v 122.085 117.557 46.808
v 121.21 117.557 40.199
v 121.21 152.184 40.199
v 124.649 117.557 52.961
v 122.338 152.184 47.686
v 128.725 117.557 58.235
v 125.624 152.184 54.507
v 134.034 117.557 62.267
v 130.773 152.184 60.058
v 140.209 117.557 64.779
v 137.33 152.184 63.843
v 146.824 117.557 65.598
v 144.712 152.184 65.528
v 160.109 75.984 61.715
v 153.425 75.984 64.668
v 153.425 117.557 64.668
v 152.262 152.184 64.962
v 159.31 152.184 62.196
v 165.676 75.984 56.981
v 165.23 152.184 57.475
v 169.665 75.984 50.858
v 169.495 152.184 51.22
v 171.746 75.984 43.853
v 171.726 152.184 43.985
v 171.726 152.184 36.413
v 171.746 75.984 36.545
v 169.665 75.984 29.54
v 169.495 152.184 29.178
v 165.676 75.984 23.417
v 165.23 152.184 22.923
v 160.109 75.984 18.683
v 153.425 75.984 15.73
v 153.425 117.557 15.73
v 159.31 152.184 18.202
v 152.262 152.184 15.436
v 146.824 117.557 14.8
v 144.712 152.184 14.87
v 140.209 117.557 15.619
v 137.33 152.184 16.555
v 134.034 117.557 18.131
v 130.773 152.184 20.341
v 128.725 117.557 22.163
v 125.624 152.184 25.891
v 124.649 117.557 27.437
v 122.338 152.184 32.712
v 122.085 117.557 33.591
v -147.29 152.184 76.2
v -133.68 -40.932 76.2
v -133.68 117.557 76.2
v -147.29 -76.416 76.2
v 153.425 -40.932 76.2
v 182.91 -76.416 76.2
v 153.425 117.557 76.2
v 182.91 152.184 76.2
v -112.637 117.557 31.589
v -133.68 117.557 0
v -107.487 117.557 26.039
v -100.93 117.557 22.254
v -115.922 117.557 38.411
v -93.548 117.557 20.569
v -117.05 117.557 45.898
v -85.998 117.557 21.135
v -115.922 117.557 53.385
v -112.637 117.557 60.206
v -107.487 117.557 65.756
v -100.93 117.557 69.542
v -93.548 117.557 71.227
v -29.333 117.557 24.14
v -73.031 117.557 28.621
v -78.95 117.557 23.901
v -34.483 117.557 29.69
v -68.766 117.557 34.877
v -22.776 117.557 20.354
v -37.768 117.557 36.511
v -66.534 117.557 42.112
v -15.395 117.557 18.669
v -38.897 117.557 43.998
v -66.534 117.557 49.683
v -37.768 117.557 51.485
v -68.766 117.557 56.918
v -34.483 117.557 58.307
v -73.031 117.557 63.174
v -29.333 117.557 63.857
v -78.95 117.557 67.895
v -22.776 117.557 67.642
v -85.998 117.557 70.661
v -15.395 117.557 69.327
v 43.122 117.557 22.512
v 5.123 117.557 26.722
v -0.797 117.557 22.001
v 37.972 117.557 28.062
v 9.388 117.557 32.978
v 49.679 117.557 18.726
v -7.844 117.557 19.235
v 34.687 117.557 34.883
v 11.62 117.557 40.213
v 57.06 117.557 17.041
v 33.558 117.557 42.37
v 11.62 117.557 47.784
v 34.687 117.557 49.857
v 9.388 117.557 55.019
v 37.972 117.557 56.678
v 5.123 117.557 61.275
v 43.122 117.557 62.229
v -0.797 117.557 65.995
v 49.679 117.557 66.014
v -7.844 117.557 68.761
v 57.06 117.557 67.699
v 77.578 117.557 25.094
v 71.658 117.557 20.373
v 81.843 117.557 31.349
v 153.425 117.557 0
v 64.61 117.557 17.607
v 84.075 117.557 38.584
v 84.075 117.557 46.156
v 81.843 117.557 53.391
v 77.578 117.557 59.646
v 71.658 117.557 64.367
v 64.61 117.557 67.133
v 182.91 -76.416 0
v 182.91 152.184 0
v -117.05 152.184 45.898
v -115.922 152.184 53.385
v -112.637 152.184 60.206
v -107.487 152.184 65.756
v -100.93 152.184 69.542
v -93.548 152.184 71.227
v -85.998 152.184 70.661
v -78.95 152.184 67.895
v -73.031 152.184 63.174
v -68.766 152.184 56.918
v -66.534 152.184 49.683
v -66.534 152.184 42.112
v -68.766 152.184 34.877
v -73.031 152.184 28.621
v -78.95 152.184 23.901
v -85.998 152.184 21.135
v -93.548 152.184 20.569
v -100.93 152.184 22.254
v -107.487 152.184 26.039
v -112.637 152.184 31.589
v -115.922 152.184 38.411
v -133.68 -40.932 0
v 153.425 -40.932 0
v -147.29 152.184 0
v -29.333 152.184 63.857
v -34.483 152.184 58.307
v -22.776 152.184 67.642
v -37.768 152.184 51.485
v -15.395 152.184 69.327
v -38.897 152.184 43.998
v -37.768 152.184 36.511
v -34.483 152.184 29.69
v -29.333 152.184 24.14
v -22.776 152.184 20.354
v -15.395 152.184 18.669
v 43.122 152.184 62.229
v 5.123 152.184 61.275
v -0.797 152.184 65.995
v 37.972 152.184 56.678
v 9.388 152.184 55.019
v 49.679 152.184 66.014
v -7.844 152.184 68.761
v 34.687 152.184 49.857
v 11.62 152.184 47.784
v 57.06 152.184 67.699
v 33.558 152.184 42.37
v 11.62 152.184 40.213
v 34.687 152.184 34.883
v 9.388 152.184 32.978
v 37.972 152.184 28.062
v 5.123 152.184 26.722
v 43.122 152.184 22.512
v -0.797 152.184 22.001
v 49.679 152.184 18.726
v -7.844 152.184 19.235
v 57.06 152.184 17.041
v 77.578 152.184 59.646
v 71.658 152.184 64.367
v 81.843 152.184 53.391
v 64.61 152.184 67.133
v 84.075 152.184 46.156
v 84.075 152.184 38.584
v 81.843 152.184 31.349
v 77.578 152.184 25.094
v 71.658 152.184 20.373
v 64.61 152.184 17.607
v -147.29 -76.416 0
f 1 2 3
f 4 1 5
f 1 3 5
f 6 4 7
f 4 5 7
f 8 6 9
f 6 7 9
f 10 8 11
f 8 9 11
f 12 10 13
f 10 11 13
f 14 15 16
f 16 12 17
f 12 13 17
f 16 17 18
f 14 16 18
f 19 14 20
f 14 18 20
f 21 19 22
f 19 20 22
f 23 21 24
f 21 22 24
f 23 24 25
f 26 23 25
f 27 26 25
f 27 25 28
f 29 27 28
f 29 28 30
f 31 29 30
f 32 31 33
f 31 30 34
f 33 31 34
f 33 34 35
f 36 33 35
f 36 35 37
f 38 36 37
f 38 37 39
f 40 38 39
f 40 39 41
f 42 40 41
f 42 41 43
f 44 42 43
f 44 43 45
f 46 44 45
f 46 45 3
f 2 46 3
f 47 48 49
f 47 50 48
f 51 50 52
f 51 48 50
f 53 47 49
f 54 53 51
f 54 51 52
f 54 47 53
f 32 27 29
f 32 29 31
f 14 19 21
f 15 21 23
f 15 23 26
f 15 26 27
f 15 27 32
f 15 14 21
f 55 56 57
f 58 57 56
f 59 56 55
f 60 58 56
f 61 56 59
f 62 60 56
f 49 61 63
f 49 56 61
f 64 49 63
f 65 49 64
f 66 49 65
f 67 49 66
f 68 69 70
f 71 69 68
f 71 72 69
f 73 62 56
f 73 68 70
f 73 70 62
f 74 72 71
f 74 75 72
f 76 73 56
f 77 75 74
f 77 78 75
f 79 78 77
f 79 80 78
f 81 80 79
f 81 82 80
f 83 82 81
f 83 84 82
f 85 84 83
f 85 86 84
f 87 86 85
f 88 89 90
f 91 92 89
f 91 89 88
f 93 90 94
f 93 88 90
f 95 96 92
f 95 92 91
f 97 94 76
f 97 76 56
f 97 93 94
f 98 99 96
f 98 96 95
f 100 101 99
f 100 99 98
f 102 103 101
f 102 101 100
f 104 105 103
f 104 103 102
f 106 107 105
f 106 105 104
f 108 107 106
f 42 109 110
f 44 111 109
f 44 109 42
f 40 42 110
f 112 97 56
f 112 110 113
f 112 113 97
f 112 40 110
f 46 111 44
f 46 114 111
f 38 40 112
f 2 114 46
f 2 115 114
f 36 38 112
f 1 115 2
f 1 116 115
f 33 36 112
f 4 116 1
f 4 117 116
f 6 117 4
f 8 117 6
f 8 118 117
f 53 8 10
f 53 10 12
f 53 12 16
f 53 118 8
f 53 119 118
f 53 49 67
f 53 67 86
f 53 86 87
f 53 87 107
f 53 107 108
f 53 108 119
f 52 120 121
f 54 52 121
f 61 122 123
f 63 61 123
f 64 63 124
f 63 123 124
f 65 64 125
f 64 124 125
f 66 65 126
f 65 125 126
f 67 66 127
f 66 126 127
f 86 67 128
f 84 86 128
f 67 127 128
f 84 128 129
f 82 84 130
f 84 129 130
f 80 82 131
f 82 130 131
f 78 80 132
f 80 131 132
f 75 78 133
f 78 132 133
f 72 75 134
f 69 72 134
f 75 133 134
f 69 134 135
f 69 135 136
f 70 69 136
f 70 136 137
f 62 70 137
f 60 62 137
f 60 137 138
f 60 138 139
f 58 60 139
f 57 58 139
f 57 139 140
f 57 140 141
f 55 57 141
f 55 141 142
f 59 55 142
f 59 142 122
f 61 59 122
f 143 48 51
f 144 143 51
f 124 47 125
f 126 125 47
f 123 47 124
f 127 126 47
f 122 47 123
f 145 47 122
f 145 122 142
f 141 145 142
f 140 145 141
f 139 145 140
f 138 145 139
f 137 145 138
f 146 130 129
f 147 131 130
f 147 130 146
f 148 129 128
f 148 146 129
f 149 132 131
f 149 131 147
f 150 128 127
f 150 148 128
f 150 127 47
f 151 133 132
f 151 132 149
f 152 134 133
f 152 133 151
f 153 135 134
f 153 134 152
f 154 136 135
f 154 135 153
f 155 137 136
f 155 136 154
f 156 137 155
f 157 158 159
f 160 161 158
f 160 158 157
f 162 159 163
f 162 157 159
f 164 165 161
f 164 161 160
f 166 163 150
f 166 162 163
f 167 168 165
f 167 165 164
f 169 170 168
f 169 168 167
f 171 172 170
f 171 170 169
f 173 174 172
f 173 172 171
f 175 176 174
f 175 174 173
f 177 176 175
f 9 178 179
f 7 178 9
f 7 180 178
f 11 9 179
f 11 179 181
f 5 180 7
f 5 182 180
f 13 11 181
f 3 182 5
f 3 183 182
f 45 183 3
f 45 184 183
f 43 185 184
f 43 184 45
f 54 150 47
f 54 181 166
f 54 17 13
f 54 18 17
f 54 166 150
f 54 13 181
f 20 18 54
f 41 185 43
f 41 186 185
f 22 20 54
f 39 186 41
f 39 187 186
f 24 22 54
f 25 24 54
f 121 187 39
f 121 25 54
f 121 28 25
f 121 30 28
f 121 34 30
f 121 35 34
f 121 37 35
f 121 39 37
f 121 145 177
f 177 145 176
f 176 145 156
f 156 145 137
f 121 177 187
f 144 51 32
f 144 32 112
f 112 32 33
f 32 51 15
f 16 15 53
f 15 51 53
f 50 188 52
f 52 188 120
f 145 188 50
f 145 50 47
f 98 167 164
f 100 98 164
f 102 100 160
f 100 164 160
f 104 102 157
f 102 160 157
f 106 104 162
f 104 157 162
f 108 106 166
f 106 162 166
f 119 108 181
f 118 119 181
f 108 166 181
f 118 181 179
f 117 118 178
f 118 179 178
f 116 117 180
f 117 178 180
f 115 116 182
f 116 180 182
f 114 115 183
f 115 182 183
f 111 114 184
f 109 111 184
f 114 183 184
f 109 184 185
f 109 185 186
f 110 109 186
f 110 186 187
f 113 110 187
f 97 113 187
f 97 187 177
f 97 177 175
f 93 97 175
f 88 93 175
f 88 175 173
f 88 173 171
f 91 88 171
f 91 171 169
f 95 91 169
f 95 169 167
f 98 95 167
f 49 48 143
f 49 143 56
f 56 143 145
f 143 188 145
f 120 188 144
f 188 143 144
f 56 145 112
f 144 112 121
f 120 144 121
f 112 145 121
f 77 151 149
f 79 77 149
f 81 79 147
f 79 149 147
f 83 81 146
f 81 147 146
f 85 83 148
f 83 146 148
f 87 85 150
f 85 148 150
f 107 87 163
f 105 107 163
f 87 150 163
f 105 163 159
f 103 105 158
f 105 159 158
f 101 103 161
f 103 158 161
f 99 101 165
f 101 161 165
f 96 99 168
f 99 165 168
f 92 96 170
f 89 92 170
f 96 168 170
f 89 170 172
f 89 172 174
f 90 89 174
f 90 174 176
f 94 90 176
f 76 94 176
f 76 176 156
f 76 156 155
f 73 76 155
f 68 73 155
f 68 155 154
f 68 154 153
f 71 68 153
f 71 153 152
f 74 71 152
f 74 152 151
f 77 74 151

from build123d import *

# Parameters (mm, degrees)
F0_W      = 330.2
F0_H      = 228.6
F1_DEPTH  = 76.2
F4_W      = 287.104944
F4_H      = 158.488579
F5_DEPTH  = 127
F2_R      = 25.4
F6_DEPTH  = 76.2
F6_FACE_R = 25.4
F7_DEPTH  = 152.4


with BuildPart() as f1:
    # F0 (on Top) → F1 (new body)
    with BuildSketch(Plane.XY):
        with Locations((17.809838, 37.883661)):
            Rectangle(F0_W, F0_H)
    extrude(amount=F1_DEPTH)

    # F4 (on face) → F5 (cut)
    with BuildSketch(Plane.XY.offset(76.2)):
        with Locations((9.872635, 38.312387)):
            Rectangle(F4_W, F4_H)
    extrude(amount=-F5_DEPTH, mode=Mode.SUBTRACT)

    # F2 (on face) → F6 (join)
    with BuildSketch(Plane(origin=(0, 152.183661, 0), x_dir=(-1, 0, 0), z_dir=(0, 1, 0))):
        with Locations((-146.609987, 40.1991)):
            Circle(F2_R)
        with Locations((-58.958468, 42.370036)):
            Circle(F2_R)
        with Locations((13.496502, 43.998241)):
            Circle(F2_R)
        with Locations((91.650177, 45.897806)):
            Circle(F2_R)
    extrude(amount=F6_DEPTH)

    # F6_face (on face) → F7 (cut)
    with BuildSketch(Plane(origin=(146.609987, 228.383661, 40.1991), x_dir=(-1, 0, 0), z_dir=(0, 1, 0))):
        Circle(F6_FACE_R)
        with Locations((87.651519, 2.170936)):
            Circle(F6_FACE_R)
        with Locations((160.106489, 3.799141)):
            Circle(F6_FACE_R)
        with Locations((238.260164, 5.698706)):
            Circle(F6_FACE_R)
    extrude(amount=-F7_DEPTH, mode=Mode.SUBTRACT)


solid = f1.part
